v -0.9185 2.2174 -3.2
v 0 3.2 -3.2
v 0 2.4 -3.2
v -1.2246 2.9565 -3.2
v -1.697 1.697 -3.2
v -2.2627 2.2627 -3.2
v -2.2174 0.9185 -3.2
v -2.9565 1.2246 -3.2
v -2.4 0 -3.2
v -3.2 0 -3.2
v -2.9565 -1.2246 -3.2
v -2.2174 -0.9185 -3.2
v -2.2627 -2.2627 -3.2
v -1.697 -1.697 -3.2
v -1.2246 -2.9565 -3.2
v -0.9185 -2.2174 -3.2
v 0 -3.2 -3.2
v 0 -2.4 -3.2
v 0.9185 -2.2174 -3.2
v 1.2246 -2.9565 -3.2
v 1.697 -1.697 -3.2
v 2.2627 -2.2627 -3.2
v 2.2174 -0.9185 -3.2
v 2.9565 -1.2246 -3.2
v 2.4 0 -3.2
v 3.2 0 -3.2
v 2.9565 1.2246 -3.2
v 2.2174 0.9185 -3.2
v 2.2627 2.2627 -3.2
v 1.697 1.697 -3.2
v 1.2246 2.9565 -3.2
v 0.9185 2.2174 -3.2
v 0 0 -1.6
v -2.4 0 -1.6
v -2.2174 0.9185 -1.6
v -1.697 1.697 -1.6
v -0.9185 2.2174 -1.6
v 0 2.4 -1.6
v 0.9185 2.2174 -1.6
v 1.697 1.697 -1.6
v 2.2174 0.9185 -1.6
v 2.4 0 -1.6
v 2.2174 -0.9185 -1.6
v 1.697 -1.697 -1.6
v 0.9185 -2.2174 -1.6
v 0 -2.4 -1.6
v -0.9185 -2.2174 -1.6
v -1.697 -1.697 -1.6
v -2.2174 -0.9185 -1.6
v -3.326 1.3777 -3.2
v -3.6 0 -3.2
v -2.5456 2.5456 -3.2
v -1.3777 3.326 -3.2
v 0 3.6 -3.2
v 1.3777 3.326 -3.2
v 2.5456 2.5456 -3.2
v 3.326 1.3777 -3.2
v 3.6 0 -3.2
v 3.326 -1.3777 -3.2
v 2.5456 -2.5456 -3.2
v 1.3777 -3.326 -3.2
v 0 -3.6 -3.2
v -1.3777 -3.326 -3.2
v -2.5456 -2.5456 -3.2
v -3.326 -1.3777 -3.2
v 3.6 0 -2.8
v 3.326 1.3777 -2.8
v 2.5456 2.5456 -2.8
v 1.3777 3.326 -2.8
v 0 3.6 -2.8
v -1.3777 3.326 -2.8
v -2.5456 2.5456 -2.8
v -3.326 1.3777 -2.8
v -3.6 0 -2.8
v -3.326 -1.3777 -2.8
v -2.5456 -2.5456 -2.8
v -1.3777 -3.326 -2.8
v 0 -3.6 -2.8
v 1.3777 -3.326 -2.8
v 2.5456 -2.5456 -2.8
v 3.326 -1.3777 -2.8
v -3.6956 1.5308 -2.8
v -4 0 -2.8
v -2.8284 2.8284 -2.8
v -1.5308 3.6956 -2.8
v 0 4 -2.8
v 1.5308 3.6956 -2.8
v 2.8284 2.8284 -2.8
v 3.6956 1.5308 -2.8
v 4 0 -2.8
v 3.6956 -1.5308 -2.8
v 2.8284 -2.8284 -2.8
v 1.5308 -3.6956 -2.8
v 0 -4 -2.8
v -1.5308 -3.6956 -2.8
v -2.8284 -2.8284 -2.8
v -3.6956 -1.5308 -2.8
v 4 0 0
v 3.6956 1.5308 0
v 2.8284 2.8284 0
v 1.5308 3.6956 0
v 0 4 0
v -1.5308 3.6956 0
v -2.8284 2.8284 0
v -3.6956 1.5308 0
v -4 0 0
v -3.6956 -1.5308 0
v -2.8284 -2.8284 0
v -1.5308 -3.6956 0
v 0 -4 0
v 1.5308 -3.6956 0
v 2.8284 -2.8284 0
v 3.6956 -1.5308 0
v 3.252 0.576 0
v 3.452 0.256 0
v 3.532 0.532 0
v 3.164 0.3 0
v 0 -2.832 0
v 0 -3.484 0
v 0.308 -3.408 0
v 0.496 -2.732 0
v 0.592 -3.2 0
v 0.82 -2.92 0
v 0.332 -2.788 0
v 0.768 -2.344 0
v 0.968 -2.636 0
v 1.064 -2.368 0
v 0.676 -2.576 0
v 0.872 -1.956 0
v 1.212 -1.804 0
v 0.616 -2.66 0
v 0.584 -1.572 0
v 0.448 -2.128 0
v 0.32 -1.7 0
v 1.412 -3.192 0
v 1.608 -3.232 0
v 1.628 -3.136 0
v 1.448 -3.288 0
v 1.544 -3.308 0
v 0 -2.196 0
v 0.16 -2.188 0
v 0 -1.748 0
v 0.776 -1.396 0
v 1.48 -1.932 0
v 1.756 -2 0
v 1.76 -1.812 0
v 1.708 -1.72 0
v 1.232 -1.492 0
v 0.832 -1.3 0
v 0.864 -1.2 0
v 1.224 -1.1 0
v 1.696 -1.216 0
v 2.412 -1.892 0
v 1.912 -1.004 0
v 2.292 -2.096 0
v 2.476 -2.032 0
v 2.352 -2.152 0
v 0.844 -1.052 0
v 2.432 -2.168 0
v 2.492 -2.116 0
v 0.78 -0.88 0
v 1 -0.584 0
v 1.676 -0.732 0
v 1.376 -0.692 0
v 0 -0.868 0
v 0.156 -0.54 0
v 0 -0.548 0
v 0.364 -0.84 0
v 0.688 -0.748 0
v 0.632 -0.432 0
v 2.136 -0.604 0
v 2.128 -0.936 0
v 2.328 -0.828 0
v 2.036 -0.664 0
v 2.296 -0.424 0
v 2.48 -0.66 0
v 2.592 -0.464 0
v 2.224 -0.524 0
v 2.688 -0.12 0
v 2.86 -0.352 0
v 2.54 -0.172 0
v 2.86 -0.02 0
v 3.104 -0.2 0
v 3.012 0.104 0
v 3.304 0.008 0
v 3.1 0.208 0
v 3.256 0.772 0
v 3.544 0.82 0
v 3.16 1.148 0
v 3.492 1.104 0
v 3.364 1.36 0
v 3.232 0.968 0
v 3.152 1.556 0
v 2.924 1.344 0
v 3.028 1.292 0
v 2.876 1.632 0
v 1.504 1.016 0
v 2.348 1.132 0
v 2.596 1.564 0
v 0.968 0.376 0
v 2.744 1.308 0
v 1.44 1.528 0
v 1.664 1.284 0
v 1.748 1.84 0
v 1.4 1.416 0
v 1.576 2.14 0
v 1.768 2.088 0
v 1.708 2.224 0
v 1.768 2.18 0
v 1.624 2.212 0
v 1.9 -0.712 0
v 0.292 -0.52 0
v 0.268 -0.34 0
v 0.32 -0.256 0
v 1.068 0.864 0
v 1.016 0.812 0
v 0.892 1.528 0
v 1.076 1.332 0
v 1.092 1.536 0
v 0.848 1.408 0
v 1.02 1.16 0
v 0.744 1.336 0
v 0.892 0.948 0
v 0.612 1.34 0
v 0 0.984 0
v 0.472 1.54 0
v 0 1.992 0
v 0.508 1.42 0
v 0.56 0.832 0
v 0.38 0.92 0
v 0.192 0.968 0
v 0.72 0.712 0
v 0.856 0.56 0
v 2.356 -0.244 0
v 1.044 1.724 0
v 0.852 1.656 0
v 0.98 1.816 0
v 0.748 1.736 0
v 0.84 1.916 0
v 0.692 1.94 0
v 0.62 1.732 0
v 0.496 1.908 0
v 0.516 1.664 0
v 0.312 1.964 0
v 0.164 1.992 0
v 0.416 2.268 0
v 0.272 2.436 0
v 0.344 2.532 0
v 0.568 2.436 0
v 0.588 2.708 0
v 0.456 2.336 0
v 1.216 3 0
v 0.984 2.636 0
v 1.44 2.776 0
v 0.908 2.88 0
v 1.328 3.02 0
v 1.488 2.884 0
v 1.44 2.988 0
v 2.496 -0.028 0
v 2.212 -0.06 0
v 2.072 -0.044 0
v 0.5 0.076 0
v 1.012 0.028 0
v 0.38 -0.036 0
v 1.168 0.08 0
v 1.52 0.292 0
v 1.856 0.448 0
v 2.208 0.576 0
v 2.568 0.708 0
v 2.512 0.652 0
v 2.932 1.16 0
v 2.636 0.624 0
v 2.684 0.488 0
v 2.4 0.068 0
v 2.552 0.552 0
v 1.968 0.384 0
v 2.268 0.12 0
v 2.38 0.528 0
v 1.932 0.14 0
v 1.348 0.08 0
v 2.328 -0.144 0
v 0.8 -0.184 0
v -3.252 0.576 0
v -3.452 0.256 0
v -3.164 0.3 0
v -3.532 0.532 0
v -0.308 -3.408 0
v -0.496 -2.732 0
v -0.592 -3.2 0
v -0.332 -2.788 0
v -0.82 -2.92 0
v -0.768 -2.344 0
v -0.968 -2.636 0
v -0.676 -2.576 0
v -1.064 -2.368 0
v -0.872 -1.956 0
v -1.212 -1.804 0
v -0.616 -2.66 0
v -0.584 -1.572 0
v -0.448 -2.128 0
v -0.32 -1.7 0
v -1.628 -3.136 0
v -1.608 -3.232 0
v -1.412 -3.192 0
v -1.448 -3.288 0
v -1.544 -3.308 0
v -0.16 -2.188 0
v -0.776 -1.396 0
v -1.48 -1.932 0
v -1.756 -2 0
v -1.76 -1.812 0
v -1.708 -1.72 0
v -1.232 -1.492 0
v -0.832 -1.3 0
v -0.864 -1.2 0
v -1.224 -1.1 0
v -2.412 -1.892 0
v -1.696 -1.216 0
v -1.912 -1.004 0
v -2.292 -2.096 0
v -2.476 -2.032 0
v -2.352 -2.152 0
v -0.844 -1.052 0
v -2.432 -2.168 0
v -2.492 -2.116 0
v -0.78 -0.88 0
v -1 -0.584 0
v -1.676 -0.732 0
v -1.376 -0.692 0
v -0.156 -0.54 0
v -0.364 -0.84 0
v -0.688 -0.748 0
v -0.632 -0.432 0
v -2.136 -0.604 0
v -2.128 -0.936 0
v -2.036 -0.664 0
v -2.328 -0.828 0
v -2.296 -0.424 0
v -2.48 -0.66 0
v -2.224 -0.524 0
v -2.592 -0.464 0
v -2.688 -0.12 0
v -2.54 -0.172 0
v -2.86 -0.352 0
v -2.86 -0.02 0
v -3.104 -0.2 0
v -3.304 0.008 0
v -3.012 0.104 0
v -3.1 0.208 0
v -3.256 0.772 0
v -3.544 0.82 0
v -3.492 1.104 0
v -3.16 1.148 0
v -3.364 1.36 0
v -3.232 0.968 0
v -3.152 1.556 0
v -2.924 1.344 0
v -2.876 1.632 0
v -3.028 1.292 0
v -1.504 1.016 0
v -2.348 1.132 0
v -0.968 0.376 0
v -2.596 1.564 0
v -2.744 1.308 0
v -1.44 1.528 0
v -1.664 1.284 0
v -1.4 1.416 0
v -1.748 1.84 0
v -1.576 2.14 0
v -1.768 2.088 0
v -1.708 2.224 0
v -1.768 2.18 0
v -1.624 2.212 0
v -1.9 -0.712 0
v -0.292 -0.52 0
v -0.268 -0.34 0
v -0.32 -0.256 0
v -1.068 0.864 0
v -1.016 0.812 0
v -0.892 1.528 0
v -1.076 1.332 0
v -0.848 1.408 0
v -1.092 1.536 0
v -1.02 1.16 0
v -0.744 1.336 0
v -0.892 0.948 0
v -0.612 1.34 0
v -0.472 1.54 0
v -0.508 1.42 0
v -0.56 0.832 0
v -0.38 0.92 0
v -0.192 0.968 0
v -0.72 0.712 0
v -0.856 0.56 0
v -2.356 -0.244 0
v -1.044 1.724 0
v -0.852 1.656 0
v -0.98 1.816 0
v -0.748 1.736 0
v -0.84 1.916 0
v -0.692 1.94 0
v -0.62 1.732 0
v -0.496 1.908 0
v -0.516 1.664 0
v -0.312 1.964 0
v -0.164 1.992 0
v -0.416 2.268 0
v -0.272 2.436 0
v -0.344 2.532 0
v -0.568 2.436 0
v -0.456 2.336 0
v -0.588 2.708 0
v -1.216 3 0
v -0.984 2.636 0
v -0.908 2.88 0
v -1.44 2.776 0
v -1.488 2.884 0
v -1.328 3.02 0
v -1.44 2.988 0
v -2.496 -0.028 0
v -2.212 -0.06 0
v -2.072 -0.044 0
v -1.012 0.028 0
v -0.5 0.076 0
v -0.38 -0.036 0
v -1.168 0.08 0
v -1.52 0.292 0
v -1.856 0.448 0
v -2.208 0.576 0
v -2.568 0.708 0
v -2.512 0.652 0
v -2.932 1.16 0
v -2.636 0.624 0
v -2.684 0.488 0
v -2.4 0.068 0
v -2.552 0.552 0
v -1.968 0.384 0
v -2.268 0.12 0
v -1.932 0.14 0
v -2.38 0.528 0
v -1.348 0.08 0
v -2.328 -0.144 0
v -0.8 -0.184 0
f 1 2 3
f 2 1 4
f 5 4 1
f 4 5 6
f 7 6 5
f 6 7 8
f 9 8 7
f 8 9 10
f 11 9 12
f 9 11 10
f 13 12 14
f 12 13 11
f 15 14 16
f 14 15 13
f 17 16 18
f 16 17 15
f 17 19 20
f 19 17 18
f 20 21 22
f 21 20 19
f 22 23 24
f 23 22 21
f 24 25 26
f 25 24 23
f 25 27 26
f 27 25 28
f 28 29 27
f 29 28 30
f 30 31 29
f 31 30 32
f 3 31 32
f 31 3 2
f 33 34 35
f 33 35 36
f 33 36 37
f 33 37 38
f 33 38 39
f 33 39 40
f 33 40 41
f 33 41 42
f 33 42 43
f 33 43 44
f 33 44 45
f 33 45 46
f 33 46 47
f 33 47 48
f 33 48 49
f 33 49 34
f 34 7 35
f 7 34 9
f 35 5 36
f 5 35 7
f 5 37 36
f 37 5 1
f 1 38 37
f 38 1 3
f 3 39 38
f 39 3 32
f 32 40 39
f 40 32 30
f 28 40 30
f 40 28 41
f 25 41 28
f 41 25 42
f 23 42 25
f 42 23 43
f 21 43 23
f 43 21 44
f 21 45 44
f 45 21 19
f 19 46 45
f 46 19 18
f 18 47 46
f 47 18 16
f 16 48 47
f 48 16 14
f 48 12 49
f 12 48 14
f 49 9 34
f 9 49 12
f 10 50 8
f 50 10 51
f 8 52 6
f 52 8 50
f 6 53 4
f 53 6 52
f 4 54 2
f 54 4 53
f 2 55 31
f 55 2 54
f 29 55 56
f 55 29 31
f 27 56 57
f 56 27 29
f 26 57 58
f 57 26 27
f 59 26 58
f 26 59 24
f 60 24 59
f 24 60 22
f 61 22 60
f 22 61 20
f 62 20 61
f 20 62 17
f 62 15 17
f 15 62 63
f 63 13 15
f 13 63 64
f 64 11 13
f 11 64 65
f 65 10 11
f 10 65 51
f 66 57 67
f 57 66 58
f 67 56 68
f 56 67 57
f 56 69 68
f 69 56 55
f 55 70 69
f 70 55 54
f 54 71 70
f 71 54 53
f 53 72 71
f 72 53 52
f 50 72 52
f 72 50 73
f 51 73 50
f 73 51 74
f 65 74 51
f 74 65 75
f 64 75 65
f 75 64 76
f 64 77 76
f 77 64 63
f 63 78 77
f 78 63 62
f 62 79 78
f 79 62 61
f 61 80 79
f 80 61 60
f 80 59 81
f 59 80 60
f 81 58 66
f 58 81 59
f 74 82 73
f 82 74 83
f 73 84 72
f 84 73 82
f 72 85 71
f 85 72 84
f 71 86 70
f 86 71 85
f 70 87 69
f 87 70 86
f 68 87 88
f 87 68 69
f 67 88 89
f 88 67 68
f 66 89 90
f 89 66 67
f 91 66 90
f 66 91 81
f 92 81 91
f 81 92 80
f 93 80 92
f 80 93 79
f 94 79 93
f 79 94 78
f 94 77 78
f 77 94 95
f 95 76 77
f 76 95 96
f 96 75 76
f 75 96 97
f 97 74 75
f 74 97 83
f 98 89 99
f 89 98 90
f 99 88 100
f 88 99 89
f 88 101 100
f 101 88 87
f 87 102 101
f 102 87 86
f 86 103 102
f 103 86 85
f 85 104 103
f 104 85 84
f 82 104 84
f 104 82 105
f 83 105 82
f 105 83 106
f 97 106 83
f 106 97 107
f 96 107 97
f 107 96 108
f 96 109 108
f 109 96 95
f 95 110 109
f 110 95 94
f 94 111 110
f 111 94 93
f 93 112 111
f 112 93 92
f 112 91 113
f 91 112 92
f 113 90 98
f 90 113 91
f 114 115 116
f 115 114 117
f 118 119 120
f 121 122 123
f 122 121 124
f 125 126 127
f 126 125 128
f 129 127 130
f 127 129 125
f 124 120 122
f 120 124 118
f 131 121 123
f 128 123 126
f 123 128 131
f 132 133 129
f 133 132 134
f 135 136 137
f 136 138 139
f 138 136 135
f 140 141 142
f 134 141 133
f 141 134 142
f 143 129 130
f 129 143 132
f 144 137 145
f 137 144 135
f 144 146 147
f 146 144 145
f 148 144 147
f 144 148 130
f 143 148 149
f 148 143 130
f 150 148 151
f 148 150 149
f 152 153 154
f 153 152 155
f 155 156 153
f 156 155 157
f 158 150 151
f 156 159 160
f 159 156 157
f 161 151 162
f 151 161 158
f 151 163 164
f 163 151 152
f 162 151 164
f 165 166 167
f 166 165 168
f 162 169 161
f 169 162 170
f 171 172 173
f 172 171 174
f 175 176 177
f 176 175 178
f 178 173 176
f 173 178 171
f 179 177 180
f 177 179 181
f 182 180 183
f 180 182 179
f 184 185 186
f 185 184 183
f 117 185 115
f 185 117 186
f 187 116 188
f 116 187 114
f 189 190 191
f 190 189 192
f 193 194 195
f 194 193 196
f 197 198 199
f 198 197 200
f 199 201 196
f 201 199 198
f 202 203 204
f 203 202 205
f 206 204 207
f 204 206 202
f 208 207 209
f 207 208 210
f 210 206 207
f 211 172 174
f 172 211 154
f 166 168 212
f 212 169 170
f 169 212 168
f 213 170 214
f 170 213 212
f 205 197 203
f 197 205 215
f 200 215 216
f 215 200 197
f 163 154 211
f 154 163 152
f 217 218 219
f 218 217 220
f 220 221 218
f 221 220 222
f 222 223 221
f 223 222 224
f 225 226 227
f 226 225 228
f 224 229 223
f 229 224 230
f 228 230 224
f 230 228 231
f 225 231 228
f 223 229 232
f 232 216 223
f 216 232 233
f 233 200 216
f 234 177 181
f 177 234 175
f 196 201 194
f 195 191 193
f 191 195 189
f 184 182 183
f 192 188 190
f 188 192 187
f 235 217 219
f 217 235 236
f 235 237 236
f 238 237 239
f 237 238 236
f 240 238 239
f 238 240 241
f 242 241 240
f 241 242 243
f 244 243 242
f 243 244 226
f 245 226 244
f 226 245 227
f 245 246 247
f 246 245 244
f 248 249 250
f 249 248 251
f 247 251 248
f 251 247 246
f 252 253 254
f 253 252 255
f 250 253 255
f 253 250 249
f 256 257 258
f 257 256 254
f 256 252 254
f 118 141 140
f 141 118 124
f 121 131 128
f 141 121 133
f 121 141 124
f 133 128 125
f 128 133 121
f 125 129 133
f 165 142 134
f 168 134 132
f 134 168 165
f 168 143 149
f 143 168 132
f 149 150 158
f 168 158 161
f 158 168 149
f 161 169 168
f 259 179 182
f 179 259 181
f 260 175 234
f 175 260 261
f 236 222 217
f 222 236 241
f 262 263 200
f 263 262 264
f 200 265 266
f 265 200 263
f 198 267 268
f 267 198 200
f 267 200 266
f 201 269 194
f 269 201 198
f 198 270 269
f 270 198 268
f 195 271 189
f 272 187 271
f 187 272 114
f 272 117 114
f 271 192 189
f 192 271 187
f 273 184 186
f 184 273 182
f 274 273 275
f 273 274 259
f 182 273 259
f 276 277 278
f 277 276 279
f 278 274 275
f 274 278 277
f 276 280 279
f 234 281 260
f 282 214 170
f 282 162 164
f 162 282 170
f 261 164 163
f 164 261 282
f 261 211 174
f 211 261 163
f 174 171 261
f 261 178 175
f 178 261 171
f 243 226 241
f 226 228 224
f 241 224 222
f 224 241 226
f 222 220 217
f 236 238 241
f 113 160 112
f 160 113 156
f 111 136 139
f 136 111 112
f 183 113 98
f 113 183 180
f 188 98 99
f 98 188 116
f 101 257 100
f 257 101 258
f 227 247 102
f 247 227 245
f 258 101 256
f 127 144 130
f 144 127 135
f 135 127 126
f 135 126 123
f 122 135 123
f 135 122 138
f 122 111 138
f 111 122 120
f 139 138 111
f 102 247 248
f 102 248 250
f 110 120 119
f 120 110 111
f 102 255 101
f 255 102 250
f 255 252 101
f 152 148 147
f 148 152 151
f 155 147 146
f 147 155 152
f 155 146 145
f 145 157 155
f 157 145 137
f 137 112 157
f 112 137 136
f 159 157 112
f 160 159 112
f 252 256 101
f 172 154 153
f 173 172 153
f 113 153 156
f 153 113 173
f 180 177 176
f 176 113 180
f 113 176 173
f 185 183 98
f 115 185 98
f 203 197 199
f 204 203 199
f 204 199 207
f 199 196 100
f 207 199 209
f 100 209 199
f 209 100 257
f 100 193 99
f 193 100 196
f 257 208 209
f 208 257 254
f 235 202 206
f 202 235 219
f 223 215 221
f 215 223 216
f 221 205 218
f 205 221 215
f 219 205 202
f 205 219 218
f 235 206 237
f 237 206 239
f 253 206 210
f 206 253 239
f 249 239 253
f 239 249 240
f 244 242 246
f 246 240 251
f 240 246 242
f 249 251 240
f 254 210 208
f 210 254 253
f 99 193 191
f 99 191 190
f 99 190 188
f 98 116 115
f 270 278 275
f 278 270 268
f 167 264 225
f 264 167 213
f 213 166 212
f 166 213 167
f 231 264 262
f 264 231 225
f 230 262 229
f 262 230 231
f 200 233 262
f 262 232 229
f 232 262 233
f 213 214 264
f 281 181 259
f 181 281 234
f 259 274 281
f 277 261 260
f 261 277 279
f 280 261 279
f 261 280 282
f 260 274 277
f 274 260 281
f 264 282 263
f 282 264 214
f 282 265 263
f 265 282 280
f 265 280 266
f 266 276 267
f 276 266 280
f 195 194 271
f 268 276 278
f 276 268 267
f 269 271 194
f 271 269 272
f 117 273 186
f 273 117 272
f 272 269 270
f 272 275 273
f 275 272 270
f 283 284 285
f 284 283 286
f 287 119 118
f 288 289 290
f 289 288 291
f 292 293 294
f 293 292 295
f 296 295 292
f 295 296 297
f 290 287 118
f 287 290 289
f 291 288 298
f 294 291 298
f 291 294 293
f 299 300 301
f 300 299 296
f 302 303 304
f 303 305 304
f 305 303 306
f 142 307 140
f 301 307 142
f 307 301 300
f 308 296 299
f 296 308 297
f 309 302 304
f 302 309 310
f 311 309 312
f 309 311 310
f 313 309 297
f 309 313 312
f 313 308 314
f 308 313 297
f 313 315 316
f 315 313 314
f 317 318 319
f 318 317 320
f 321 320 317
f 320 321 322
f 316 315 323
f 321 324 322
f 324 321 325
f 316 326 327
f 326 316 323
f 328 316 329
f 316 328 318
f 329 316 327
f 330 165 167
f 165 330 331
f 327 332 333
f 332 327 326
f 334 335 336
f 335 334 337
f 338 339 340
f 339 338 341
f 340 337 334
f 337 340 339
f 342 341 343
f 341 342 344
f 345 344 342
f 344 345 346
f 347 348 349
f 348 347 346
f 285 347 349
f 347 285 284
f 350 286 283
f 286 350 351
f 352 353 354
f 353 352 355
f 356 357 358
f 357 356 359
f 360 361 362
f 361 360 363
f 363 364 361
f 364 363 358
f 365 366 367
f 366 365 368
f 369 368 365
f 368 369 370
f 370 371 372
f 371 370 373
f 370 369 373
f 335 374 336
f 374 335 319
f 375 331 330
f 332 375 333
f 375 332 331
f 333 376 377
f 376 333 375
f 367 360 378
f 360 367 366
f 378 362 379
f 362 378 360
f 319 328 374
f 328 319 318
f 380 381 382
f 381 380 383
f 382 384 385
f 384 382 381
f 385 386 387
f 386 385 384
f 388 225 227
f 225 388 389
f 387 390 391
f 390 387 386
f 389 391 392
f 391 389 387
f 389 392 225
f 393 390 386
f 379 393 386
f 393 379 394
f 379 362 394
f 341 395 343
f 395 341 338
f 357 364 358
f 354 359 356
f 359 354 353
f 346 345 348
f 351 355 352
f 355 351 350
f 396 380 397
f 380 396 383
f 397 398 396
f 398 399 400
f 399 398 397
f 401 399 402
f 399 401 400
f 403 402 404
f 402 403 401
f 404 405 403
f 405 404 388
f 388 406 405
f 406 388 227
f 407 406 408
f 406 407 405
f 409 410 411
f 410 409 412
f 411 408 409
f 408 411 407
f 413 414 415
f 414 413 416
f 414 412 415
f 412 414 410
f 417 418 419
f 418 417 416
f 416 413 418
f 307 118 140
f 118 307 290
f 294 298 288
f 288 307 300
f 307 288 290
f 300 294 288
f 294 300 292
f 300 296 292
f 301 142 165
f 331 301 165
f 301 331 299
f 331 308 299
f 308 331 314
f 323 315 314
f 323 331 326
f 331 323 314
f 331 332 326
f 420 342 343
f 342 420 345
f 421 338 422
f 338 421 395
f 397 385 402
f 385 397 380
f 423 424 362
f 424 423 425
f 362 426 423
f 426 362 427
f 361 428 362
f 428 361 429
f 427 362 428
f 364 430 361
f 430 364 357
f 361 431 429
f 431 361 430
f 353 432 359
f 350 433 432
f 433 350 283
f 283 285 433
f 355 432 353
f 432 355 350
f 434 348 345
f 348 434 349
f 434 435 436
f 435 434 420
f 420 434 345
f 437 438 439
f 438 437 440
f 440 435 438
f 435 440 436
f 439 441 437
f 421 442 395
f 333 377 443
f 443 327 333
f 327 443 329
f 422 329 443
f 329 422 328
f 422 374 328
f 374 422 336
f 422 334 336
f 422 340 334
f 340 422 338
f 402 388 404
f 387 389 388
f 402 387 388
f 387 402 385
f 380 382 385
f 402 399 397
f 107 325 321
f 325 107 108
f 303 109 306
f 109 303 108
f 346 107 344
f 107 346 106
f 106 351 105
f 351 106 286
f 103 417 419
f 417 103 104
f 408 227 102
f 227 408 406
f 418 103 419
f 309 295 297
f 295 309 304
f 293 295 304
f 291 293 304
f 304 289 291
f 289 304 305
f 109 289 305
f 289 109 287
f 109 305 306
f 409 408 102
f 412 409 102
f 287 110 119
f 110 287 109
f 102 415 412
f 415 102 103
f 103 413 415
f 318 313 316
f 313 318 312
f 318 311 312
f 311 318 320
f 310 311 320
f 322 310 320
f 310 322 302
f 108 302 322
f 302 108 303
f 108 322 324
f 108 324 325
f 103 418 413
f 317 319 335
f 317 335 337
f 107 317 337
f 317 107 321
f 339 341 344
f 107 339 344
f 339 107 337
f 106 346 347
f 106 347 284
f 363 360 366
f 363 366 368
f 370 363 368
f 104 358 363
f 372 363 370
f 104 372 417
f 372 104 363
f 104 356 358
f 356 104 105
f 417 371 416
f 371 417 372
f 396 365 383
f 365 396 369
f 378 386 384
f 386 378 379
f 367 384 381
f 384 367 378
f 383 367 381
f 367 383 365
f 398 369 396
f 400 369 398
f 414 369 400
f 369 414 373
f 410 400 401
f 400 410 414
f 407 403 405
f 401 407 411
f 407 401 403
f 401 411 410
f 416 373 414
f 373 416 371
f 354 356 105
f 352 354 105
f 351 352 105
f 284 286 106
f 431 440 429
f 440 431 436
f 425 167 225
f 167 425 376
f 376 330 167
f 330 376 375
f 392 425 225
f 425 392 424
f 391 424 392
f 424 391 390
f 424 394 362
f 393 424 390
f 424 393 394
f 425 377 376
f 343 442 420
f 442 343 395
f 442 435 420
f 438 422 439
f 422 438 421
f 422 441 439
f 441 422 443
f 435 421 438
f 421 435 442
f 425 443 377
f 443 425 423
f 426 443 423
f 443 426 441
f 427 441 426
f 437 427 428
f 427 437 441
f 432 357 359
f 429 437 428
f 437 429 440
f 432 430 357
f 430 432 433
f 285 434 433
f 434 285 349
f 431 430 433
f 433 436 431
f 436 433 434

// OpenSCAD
use <../lib.scad>
use <../p/4-4ering.scad>
use <s/98138p3bs01.scad>
use <s/98138s02.scad>
function ldraw_lib__98138p3b() = [
// 0 Tile  1 x  1 Round with Yellow and Medium Tan Bee Pattern
// 0 Name: 98138p3b.dat
// 0 Author: Philippe Hurbain [Philo]
// 0 !LDRAW_ORG Part UPDATE 2025-02
// 0 !LICENSE Licensed under CC BY 4.0 : see CAreadme.txt
// 
// 0 BFC CERTIFY CCW
  [0,"BFC","CERTIFY"],
  [0,"BFC","CCW"],
// 
// 0 !KEYWORDS Bricklink 98138pb448, Brickowl 1160090, Insect
// 0 !KEYWORDS Rebrickable 98138pr0428, Set 42669, Set 42670
// 
// 0 !HISTORY 2025-02-27 [OrionP] Official Update 2025-02
// 
// 1 16 0 0 0 1 0 0 0 1 0 0 0 1 s\98138s02.dat
  [1,16,0,0,0,1,0,0,0,1,0,0,0,1, ldraw_lib__s__98138s02()],
// 1 16 0 0 0 10 0 0 0 1 0 0 0 10 4-4ering.dat
  [1,16,0,0,0,10,0,0,0,1,0,0,0,10, ldraw_lib__4_4ering()],
// 
// 1 16 0 0 0 1 0 0 0 1 0 0 0 1 s\98138p3bs01.dat
  [1,16,0,0,0,1,0,0,0,1,0,0,0,1, ldraw_lib__s__98138p3bs01()],
// 1 16 0 0 0 -1 0 0 0 1 0 0 0 1 s\98138p3bs01.dat
  [1,16,0,0,0,-1,0,0,0,1,0,0,0,1, ldraw_lib__s__98138p3bs01()],
];
module ldraw_lib__98138p3b(step=0, col=false, unit=2/5, alt=false, line=0.2, solid=!$preview)
    makepoly(ldraw_lib__98138p3b(), step=step, col=col, unit=unit, alt=alt, line=line, solid=solid);
ldraw_lib__98138p3b(line=0.2);
